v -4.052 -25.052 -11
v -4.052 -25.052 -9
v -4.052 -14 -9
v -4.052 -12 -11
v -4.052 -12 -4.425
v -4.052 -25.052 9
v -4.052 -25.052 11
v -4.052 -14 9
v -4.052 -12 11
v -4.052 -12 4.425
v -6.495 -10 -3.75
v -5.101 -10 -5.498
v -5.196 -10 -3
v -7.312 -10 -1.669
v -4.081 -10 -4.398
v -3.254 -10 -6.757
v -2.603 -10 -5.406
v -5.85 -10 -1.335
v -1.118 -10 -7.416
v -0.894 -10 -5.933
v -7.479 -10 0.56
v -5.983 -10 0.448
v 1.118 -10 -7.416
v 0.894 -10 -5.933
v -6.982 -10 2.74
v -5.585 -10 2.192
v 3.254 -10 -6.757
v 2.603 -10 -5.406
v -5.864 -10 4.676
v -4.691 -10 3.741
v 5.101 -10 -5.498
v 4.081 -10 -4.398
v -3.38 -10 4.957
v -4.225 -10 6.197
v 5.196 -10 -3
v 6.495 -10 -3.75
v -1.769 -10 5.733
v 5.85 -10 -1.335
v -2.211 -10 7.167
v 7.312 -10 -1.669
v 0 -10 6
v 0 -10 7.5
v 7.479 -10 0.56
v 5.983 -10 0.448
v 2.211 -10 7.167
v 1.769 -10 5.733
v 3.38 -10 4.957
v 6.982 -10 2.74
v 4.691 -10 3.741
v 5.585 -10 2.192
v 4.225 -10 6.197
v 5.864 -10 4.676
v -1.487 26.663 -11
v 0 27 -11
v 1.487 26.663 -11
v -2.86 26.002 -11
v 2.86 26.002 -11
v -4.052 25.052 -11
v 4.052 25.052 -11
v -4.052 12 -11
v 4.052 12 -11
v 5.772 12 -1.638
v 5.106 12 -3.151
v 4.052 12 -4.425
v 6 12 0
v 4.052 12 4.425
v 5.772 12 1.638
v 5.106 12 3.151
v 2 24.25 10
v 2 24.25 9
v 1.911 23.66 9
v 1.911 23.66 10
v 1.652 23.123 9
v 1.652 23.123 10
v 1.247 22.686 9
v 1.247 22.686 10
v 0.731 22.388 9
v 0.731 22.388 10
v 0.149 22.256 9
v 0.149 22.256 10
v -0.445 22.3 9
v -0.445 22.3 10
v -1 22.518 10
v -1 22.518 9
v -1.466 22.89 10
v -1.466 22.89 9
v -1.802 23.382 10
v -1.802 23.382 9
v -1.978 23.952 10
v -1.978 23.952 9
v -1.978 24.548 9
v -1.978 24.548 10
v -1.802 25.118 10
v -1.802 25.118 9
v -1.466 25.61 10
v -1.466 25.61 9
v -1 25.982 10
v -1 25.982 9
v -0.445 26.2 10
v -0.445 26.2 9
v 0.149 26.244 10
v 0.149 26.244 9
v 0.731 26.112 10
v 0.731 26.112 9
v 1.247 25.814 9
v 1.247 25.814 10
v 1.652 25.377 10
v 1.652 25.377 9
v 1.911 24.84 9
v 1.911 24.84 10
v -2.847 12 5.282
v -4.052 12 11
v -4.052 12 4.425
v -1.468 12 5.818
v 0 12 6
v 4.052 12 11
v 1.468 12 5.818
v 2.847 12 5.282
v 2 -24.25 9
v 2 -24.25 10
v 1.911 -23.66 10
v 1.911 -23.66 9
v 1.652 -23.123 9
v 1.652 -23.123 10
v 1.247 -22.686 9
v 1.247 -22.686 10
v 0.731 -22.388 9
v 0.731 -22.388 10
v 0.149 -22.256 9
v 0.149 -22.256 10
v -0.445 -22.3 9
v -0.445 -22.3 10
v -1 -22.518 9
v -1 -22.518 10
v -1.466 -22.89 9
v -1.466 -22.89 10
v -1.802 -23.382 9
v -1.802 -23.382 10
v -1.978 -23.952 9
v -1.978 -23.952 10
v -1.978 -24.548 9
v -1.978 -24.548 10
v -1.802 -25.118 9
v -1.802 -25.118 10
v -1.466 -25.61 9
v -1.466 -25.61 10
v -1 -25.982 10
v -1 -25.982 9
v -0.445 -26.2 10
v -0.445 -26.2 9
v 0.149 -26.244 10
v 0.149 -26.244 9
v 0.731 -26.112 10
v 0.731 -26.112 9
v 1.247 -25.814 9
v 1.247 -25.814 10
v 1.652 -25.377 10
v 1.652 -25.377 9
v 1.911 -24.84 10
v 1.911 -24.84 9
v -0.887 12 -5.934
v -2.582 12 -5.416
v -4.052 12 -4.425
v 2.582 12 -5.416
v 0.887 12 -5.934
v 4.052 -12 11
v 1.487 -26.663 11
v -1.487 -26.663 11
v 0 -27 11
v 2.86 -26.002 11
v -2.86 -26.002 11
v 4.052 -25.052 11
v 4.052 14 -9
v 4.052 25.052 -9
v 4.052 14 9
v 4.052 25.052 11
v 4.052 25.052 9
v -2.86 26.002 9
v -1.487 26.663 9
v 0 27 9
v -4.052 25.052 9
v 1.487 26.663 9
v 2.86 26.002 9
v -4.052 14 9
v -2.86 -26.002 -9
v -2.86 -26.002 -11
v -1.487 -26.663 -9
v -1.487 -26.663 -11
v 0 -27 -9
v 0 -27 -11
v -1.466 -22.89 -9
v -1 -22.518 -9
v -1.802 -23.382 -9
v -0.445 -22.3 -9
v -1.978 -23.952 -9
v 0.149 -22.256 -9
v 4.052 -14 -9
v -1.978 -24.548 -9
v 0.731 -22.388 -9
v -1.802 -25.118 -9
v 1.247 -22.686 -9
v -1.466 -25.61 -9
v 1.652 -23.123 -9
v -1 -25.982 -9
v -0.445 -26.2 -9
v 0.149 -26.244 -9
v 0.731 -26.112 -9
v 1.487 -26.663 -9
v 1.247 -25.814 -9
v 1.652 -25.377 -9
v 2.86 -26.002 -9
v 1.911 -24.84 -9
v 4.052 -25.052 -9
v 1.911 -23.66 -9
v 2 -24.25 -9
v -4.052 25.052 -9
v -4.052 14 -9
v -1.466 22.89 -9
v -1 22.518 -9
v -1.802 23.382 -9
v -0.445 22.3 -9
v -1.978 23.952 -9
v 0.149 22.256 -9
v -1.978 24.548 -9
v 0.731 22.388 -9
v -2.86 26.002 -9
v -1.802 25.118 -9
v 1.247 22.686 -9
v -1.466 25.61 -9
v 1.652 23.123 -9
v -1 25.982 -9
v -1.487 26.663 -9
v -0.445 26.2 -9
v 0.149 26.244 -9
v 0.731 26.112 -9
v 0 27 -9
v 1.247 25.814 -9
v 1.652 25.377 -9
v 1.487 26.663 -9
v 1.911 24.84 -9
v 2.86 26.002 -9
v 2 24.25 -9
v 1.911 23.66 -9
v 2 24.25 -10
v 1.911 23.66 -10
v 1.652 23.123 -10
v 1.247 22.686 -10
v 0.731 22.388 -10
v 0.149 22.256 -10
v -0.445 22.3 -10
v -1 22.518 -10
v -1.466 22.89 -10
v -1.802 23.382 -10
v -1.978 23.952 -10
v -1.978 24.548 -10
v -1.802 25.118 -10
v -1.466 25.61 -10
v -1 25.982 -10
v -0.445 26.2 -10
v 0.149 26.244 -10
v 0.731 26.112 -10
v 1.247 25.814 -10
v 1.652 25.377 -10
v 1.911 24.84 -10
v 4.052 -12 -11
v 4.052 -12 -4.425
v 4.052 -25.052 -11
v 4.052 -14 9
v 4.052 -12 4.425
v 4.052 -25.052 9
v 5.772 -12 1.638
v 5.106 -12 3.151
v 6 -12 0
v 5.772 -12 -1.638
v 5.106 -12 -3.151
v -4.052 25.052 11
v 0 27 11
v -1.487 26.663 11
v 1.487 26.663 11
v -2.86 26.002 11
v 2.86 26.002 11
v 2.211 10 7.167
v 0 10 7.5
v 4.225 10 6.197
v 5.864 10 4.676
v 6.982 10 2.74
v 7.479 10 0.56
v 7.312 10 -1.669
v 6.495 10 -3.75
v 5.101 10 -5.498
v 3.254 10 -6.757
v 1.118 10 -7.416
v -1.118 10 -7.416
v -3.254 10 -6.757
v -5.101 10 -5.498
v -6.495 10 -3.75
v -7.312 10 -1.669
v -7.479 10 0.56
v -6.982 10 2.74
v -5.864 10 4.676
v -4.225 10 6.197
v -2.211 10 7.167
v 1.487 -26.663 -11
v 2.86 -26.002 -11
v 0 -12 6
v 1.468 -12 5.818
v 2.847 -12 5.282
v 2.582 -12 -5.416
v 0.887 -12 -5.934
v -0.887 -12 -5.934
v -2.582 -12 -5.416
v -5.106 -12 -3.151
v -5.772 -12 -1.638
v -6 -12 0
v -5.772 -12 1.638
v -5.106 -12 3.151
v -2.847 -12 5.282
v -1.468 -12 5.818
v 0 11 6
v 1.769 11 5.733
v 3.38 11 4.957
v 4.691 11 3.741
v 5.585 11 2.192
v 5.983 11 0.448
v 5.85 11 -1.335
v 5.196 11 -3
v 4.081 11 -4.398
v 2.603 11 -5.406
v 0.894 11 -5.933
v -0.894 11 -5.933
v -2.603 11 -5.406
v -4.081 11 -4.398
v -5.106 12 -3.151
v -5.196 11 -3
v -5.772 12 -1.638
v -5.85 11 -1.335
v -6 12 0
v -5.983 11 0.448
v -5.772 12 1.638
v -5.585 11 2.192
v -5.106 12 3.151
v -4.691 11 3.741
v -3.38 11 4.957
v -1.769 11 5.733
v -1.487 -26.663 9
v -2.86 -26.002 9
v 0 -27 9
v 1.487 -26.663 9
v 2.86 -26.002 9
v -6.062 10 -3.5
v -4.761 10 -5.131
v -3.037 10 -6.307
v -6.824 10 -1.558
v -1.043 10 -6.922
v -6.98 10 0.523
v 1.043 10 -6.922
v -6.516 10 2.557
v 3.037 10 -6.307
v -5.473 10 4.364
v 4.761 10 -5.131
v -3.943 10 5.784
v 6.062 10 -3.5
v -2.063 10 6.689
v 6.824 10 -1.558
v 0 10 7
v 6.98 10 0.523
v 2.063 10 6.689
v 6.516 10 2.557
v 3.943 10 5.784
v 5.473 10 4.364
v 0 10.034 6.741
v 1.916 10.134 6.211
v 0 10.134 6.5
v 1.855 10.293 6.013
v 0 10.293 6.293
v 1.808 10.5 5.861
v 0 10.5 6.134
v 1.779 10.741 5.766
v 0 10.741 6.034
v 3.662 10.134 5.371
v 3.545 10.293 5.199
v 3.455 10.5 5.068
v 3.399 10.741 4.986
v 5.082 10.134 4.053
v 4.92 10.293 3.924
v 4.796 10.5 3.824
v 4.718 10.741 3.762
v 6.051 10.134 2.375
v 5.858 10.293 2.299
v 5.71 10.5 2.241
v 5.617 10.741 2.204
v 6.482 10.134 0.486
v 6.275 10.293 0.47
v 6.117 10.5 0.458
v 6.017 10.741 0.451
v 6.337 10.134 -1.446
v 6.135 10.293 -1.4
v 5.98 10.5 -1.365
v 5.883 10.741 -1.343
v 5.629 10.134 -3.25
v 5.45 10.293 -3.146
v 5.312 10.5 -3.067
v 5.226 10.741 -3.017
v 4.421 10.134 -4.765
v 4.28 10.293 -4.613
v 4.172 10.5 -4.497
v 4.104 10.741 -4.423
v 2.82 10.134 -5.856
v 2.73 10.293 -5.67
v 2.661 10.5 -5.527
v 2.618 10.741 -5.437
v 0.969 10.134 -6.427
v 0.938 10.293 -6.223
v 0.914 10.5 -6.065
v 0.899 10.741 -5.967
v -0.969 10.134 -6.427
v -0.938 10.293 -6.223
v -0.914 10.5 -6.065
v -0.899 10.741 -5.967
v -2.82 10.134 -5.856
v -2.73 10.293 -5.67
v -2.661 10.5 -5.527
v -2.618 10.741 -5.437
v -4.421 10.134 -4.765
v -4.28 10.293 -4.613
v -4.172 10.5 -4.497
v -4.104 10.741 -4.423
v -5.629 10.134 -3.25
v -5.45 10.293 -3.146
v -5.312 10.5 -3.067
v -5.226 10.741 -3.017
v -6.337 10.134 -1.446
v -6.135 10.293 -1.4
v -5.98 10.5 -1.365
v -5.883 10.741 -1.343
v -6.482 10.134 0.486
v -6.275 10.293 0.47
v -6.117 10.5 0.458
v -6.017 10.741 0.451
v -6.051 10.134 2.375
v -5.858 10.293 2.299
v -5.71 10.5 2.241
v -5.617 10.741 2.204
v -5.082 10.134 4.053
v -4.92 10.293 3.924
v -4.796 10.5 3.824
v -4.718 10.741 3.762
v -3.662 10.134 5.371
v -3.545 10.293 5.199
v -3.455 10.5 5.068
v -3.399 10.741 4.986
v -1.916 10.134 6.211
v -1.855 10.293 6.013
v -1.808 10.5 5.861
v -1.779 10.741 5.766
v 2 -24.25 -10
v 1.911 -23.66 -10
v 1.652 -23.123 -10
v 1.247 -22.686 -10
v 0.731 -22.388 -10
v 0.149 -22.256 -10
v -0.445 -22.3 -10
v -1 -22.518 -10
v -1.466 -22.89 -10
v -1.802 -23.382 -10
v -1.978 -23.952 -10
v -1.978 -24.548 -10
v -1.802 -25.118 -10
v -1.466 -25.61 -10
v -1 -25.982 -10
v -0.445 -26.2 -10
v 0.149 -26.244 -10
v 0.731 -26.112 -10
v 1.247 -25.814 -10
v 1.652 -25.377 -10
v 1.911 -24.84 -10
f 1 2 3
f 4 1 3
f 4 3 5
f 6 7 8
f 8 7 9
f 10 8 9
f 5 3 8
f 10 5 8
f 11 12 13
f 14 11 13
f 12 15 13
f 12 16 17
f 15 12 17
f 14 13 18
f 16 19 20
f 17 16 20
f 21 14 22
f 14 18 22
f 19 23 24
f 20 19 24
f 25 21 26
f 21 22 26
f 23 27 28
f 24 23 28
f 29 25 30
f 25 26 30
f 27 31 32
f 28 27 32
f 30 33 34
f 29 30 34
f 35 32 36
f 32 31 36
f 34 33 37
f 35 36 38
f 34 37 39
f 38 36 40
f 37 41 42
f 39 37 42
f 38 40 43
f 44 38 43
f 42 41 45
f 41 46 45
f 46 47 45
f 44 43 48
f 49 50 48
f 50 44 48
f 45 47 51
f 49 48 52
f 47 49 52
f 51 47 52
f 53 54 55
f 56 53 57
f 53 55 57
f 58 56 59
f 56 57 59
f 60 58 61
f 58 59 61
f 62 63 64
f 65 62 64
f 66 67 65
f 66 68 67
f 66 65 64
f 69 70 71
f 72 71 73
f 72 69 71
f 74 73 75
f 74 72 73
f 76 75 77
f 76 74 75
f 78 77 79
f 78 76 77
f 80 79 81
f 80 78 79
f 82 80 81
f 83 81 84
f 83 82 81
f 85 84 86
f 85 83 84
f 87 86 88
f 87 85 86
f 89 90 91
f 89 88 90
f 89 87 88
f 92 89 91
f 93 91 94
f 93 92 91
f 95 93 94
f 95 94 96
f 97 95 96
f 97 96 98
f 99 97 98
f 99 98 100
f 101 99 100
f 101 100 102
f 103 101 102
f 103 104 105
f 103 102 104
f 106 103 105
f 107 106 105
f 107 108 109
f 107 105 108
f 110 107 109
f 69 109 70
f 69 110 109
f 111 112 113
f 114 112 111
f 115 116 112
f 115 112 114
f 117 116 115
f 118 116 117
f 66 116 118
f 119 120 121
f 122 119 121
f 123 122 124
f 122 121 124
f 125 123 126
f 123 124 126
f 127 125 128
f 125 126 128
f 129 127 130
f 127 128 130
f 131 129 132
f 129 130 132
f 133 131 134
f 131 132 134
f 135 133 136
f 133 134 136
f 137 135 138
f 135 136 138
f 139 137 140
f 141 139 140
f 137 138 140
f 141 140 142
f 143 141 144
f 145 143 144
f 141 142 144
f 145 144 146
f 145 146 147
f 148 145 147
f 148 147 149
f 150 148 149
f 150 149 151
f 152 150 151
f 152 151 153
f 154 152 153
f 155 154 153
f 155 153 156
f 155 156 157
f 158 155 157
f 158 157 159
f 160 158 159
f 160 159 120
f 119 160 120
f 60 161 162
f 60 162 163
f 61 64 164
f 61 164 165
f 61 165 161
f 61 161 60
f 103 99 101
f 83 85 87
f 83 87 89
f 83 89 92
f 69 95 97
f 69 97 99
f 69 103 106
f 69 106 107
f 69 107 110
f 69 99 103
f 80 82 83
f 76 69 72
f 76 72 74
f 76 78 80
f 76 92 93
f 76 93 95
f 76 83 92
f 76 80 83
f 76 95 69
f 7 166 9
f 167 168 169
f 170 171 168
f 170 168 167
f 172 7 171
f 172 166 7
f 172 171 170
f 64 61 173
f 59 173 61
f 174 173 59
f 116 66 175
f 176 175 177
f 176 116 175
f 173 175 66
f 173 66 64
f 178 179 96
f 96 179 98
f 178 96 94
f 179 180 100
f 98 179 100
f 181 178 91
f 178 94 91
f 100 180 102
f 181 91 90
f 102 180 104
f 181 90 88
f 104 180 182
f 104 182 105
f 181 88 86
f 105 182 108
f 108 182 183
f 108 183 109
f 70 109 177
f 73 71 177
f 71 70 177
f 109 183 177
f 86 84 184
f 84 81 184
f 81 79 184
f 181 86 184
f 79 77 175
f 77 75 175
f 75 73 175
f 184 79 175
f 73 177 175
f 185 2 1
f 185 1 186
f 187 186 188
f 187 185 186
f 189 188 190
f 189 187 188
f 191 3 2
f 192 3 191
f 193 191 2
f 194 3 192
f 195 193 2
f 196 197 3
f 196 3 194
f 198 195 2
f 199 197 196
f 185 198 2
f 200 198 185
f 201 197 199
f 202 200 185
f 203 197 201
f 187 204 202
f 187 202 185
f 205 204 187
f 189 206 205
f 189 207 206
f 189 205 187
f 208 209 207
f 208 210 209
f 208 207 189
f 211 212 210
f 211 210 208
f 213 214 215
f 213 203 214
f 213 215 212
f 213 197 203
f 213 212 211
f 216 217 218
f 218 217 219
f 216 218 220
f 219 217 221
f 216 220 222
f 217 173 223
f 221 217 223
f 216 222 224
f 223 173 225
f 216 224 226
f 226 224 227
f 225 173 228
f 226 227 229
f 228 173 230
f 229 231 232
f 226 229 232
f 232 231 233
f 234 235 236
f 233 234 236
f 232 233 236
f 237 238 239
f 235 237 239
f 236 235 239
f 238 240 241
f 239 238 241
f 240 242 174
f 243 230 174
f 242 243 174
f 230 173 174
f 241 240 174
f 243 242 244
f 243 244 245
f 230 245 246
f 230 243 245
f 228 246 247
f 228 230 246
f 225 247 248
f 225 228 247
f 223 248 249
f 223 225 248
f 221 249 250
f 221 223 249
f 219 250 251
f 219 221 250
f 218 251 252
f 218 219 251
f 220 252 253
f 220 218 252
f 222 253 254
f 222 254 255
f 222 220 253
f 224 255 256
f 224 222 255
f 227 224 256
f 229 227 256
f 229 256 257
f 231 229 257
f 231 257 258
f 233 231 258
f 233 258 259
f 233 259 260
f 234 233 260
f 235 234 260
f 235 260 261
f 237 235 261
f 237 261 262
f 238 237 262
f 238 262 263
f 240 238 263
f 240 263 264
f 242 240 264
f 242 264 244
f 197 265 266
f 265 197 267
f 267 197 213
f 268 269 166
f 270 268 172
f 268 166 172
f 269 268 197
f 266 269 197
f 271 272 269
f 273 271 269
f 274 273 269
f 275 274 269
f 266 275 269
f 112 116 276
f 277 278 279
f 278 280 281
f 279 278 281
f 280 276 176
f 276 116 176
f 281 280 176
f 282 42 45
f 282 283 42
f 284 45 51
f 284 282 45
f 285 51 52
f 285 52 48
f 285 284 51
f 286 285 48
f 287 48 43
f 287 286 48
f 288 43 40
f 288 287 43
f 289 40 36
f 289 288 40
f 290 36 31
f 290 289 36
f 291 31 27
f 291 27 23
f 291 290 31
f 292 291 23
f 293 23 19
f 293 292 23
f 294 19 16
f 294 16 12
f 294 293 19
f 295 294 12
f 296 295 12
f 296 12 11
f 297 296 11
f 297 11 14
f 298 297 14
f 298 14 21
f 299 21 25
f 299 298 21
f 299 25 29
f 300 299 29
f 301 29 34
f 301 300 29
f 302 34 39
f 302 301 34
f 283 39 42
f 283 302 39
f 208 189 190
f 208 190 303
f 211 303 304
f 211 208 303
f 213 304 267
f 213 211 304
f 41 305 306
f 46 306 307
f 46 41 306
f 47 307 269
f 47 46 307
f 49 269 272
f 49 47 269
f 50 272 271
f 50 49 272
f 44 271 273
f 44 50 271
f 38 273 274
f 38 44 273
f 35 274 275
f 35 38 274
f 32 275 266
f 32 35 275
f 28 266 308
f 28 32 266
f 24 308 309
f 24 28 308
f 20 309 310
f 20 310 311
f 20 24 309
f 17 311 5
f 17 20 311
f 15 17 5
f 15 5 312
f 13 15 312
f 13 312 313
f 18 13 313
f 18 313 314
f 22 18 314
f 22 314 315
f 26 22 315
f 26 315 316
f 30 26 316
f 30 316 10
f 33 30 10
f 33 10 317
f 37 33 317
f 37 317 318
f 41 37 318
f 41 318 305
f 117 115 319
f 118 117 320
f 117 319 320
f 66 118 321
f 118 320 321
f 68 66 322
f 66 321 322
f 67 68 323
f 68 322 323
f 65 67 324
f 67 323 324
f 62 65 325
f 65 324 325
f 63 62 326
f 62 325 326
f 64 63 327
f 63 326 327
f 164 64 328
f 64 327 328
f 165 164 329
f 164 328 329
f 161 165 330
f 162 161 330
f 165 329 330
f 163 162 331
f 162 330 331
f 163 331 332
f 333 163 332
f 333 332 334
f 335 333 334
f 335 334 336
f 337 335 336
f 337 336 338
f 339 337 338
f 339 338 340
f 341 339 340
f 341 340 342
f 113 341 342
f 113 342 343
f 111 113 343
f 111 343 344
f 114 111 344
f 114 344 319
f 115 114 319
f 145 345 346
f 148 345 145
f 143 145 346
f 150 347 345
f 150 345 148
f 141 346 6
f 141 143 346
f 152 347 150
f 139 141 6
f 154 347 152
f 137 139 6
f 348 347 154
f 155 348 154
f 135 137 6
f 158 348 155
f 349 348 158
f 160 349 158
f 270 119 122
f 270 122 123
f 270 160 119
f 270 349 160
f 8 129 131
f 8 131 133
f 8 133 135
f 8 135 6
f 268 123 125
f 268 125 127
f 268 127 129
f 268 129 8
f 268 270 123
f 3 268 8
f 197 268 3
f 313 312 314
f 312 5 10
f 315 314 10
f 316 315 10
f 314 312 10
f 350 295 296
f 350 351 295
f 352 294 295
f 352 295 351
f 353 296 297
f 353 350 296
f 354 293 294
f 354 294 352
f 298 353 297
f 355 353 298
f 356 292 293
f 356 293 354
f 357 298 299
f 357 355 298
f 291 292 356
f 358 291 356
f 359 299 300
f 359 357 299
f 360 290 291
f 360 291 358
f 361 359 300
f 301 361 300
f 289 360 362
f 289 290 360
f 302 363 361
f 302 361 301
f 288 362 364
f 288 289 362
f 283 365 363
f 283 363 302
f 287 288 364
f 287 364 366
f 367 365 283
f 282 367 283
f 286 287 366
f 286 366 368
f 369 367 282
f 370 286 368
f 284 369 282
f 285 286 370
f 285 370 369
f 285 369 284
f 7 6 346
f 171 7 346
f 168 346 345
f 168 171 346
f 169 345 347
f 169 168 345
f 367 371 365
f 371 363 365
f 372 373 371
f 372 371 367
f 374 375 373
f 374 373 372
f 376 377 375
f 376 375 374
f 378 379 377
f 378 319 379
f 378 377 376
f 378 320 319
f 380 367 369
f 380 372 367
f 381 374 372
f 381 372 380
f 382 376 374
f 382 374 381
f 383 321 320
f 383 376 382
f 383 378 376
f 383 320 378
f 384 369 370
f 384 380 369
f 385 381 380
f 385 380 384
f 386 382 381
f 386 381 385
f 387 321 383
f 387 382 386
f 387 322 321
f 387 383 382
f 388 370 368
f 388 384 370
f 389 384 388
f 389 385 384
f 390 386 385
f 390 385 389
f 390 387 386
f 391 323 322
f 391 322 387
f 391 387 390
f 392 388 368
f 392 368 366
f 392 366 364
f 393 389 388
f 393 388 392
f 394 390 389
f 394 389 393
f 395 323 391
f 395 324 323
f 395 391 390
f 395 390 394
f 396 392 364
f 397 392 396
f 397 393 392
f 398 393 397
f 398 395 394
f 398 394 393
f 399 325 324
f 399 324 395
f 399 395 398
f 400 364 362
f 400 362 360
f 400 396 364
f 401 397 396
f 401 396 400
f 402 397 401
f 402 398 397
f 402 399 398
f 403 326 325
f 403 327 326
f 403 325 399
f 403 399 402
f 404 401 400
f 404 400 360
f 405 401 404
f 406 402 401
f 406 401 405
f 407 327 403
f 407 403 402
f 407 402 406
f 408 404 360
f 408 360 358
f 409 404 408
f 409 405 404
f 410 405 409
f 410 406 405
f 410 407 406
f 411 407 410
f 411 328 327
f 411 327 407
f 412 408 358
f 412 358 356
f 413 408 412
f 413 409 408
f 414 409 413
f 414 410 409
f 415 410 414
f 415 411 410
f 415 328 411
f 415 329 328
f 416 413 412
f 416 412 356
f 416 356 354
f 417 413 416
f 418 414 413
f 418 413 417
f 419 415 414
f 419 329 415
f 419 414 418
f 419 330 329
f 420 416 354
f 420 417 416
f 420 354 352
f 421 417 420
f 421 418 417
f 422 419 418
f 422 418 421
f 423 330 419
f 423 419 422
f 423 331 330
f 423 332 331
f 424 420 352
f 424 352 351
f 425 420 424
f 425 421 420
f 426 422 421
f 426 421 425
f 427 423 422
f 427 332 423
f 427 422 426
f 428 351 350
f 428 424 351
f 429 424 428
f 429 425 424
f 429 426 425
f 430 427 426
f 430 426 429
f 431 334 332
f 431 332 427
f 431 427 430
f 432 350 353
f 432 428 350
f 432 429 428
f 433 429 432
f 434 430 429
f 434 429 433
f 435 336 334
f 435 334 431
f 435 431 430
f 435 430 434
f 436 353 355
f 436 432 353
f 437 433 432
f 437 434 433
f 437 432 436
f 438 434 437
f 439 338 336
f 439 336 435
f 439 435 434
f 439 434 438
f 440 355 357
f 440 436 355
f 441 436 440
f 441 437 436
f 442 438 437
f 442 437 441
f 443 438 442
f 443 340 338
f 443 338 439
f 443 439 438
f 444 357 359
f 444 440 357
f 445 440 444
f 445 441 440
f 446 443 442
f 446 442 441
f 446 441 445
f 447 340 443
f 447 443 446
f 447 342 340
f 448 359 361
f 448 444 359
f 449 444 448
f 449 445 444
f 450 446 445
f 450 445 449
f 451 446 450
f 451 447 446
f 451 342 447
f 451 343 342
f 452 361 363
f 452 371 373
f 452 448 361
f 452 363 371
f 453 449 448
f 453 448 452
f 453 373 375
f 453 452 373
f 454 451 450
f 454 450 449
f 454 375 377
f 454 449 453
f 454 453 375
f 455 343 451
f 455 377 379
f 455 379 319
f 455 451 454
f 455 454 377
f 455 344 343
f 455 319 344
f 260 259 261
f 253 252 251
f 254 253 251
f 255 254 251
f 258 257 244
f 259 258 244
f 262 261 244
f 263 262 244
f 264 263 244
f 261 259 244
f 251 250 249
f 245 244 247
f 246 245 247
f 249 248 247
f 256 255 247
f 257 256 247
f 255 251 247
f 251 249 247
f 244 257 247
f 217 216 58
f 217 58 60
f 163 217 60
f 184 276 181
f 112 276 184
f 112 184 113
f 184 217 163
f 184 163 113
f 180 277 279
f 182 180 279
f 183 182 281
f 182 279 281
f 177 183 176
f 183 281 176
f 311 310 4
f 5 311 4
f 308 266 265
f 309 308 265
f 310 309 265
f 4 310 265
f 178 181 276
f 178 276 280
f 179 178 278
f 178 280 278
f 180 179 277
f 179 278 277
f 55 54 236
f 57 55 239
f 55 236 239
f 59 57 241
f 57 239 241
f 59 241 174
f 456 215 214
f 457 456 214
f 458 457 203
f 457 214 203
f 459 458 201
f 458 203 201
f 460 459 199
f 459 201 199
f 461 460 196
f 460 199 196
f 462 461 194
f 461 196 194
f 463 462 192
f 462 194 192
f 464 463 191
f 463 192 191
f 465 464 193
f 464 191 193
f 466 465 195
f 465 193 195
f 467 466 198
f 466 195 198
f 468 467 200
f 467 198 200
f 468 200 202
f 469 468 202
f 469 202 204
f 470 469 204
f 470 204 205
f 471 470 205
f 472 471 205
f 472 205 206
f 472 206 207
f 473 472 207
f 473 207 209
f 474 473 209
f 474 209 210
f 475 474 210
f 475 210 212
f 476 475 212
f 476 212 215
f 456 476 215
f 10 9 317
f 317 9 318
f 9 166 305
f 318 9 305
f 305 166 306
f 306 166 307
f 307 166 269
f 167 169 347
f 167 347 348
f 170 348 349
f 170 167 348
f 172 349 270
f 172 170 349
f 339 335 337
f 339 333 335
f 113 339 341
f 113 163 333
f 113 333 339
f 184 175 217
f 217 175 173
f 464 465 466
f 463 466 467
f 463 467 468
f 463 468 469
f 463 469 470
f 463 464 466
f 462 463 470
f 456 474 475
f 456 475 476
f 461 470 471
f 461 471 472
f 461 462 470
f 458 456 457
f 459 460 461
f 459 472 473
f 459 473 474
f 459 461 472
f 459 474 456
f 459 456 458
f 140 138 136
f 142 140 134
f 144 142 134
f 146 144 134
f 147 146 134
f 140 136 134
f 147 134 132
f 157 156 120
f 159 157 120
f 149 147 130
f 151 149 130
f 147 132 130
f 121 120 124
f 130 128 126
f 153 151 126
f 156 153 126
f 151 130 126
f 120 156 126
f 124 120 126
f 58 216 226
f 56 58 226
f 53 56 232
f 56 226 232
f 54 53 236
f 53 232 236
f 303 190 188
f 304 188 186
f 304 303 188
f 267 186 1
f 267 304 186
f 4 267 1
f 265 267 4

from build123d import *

# Parameters (mm, degrees)
SKETCH1_R           = 7.5
BOSS_EXTRUDE1_DEPTH = 10
SKETCH5_R           = 6
BOSS_EXTRUDE2_DEPTH = 2
FILLET2_R           = 1
BOSS_EXTRUDE3_DEPTH = 6
CUT_EXTRUDE4_DEPTH  = 29
CUT_EXTRUDE5_START  = -1
SKETCH10_R          = 2
CUT_EXTRUDE5_DEPTH  = 20
CUT_EXTRUDE6_START  = -24
CUT_EXTRUDE6_DEPTH  = 24


with BuildPart() as part:
    # Sketch1 → Boss-Extrude1 (new body)
    with BuildSketch(Plane(origin=(0, 0, 0), x_dir=(1, 0, 0), z_dir=(0, 1, 0))):
        Circle(SKETCH1_R)
    boss_extrude1 = extrude(amount=BOSS_EXTRUDE1_DEPTH)

    # Sketch5 → Boss-Extrude2 (add)
    with BuildSketch(Plane(origin=(0, 10, 0), x_dir=(1, 0, 0), z_dir=(0, 1, 0))):
        Circle(SKETCH5_R)
    boss_extrude2 = extrude(amount=BOSS_EXTRUDE2_DEPTH)

    # Fillet2
    fillet2_edges = [part.edges().sort_by_distance(p)[0] for p in [
        (-6, 10, 0),
    ]]
    fillet(fillet2_edges, radius=FILLET2_R)

    # Sketch6 → Boss-Extrude3 (add, symmetric)
    with BuildSketch(Plane(origin=(0, 0, 0), x_dir=(0, 0, -1), z_dir=(1, 0, 0))):
        Polygon((6, 12), (-6, 12), (-11, 12), (-11, 27), (-9, 27), (-9, 14), (9, 14), (9, 27), (11, 27), (11, 12), align=None)
    boss_extrude3 = extrude(amount=BOSS_EXTRUDE3_DEPTH, both=True)

    # Sketch9 → Cut-Extrude4 (cut)
    with BuildSketch(Plane.XY.offset(11)):
        with BuildLine():
            Line((-6, 27), (-6, 21))
            ThreePointArc((-6, 21), (-4.052343178, 25.052343178), (0, 27))
            Line((0, 27), (-6, 27))
        make_face()
        with BuildLine():
            ThreePointArc((0, 27), (4.052343178, 25.052343178), (6, 21))
            Line((6, 21), (6, 27))
            Line((6, 27), (0, 27))
        make_face()
    cut_extrude4 = extrude(amount=-CUT_EXTRUDE4_DEPTH, mode=Mode.SUBTRACT)

    # Sketch10 → Cut-Extrude5 (cut)
    with BuildSketch(Plane(origin=(0, 0, 9), x_dir=(-1, 0, 0), z_dir=(0, 0, -1)).offset(CUT_EXTRUDE5_START)):
        with Locations((0, 24.25)):
            Circle(SKETCH10_R)
    cut_extrude5 = extrude(amount=CUT_EXTRUDE5_DEPTH, mode=Mode.SUBTRACT)

    # Mirror2: Boss-Extrude1 across plane
    add(boss_extrude1.mirror(Plane.ZX))

    # Mirror9: Boss-Extrude2, Boss-Extrude3 across plane
    add(boss_extrude2.mirror(Plane.ZX))
    add(boss_extrude3.mirror(Plane.ZX))

    # Mirror11: Cut-Extrude4, Cut-Extrude5 across plane
    add(cut_extrude4.mirror(Plane.ZX), mode=Mode.SUBTRACT)
    add(cut_extrude5.mirror(Plane.ZX), mode=Mode.SUBTRACT)

    # Sketch11 → Cut-Extrude6 (cut)
    with BuildSketch(Plane(origin=(0, 0, -11), x_dir=(-1, 0, 0), z_dir=(0, 0, -1)).offset(CUT_EXTRUDE6_START)):
        with BuildLine():
            Line((-4.052343178, 12), (-4.052343178, 25.052343178))
            ThreePointArc((-4.052343178, 25.052343178), (-5.371235948, 23.192018094), (-6, 21))
            Line((-6, 21), (-6, 12))
            Line((-6, 12), (-4.052343178, 12))
        make_face()
        with BuildLine():
            Line((4.052343178, 25.052343178), (4.052343178, 12))
            Line((4.052343178, 12), (6, 12))
            Line((6, 12), (6, 21))
            ThreePointArc((6, 21), (5.371235948, 23.192018094), (4.052343178, 25.052343178))
        make_face()
    cut_extrude6 = extrude(amount=CUT_EXTRUDE6_DEPTH, mode=Mode.SUBTRACT)

    # Mirror12: Cut-Extrude6 across plane
    add(cut_extrude6.mirror(Plane.ZX), mode=Mode.SUBTRACT)


solid = part.part
